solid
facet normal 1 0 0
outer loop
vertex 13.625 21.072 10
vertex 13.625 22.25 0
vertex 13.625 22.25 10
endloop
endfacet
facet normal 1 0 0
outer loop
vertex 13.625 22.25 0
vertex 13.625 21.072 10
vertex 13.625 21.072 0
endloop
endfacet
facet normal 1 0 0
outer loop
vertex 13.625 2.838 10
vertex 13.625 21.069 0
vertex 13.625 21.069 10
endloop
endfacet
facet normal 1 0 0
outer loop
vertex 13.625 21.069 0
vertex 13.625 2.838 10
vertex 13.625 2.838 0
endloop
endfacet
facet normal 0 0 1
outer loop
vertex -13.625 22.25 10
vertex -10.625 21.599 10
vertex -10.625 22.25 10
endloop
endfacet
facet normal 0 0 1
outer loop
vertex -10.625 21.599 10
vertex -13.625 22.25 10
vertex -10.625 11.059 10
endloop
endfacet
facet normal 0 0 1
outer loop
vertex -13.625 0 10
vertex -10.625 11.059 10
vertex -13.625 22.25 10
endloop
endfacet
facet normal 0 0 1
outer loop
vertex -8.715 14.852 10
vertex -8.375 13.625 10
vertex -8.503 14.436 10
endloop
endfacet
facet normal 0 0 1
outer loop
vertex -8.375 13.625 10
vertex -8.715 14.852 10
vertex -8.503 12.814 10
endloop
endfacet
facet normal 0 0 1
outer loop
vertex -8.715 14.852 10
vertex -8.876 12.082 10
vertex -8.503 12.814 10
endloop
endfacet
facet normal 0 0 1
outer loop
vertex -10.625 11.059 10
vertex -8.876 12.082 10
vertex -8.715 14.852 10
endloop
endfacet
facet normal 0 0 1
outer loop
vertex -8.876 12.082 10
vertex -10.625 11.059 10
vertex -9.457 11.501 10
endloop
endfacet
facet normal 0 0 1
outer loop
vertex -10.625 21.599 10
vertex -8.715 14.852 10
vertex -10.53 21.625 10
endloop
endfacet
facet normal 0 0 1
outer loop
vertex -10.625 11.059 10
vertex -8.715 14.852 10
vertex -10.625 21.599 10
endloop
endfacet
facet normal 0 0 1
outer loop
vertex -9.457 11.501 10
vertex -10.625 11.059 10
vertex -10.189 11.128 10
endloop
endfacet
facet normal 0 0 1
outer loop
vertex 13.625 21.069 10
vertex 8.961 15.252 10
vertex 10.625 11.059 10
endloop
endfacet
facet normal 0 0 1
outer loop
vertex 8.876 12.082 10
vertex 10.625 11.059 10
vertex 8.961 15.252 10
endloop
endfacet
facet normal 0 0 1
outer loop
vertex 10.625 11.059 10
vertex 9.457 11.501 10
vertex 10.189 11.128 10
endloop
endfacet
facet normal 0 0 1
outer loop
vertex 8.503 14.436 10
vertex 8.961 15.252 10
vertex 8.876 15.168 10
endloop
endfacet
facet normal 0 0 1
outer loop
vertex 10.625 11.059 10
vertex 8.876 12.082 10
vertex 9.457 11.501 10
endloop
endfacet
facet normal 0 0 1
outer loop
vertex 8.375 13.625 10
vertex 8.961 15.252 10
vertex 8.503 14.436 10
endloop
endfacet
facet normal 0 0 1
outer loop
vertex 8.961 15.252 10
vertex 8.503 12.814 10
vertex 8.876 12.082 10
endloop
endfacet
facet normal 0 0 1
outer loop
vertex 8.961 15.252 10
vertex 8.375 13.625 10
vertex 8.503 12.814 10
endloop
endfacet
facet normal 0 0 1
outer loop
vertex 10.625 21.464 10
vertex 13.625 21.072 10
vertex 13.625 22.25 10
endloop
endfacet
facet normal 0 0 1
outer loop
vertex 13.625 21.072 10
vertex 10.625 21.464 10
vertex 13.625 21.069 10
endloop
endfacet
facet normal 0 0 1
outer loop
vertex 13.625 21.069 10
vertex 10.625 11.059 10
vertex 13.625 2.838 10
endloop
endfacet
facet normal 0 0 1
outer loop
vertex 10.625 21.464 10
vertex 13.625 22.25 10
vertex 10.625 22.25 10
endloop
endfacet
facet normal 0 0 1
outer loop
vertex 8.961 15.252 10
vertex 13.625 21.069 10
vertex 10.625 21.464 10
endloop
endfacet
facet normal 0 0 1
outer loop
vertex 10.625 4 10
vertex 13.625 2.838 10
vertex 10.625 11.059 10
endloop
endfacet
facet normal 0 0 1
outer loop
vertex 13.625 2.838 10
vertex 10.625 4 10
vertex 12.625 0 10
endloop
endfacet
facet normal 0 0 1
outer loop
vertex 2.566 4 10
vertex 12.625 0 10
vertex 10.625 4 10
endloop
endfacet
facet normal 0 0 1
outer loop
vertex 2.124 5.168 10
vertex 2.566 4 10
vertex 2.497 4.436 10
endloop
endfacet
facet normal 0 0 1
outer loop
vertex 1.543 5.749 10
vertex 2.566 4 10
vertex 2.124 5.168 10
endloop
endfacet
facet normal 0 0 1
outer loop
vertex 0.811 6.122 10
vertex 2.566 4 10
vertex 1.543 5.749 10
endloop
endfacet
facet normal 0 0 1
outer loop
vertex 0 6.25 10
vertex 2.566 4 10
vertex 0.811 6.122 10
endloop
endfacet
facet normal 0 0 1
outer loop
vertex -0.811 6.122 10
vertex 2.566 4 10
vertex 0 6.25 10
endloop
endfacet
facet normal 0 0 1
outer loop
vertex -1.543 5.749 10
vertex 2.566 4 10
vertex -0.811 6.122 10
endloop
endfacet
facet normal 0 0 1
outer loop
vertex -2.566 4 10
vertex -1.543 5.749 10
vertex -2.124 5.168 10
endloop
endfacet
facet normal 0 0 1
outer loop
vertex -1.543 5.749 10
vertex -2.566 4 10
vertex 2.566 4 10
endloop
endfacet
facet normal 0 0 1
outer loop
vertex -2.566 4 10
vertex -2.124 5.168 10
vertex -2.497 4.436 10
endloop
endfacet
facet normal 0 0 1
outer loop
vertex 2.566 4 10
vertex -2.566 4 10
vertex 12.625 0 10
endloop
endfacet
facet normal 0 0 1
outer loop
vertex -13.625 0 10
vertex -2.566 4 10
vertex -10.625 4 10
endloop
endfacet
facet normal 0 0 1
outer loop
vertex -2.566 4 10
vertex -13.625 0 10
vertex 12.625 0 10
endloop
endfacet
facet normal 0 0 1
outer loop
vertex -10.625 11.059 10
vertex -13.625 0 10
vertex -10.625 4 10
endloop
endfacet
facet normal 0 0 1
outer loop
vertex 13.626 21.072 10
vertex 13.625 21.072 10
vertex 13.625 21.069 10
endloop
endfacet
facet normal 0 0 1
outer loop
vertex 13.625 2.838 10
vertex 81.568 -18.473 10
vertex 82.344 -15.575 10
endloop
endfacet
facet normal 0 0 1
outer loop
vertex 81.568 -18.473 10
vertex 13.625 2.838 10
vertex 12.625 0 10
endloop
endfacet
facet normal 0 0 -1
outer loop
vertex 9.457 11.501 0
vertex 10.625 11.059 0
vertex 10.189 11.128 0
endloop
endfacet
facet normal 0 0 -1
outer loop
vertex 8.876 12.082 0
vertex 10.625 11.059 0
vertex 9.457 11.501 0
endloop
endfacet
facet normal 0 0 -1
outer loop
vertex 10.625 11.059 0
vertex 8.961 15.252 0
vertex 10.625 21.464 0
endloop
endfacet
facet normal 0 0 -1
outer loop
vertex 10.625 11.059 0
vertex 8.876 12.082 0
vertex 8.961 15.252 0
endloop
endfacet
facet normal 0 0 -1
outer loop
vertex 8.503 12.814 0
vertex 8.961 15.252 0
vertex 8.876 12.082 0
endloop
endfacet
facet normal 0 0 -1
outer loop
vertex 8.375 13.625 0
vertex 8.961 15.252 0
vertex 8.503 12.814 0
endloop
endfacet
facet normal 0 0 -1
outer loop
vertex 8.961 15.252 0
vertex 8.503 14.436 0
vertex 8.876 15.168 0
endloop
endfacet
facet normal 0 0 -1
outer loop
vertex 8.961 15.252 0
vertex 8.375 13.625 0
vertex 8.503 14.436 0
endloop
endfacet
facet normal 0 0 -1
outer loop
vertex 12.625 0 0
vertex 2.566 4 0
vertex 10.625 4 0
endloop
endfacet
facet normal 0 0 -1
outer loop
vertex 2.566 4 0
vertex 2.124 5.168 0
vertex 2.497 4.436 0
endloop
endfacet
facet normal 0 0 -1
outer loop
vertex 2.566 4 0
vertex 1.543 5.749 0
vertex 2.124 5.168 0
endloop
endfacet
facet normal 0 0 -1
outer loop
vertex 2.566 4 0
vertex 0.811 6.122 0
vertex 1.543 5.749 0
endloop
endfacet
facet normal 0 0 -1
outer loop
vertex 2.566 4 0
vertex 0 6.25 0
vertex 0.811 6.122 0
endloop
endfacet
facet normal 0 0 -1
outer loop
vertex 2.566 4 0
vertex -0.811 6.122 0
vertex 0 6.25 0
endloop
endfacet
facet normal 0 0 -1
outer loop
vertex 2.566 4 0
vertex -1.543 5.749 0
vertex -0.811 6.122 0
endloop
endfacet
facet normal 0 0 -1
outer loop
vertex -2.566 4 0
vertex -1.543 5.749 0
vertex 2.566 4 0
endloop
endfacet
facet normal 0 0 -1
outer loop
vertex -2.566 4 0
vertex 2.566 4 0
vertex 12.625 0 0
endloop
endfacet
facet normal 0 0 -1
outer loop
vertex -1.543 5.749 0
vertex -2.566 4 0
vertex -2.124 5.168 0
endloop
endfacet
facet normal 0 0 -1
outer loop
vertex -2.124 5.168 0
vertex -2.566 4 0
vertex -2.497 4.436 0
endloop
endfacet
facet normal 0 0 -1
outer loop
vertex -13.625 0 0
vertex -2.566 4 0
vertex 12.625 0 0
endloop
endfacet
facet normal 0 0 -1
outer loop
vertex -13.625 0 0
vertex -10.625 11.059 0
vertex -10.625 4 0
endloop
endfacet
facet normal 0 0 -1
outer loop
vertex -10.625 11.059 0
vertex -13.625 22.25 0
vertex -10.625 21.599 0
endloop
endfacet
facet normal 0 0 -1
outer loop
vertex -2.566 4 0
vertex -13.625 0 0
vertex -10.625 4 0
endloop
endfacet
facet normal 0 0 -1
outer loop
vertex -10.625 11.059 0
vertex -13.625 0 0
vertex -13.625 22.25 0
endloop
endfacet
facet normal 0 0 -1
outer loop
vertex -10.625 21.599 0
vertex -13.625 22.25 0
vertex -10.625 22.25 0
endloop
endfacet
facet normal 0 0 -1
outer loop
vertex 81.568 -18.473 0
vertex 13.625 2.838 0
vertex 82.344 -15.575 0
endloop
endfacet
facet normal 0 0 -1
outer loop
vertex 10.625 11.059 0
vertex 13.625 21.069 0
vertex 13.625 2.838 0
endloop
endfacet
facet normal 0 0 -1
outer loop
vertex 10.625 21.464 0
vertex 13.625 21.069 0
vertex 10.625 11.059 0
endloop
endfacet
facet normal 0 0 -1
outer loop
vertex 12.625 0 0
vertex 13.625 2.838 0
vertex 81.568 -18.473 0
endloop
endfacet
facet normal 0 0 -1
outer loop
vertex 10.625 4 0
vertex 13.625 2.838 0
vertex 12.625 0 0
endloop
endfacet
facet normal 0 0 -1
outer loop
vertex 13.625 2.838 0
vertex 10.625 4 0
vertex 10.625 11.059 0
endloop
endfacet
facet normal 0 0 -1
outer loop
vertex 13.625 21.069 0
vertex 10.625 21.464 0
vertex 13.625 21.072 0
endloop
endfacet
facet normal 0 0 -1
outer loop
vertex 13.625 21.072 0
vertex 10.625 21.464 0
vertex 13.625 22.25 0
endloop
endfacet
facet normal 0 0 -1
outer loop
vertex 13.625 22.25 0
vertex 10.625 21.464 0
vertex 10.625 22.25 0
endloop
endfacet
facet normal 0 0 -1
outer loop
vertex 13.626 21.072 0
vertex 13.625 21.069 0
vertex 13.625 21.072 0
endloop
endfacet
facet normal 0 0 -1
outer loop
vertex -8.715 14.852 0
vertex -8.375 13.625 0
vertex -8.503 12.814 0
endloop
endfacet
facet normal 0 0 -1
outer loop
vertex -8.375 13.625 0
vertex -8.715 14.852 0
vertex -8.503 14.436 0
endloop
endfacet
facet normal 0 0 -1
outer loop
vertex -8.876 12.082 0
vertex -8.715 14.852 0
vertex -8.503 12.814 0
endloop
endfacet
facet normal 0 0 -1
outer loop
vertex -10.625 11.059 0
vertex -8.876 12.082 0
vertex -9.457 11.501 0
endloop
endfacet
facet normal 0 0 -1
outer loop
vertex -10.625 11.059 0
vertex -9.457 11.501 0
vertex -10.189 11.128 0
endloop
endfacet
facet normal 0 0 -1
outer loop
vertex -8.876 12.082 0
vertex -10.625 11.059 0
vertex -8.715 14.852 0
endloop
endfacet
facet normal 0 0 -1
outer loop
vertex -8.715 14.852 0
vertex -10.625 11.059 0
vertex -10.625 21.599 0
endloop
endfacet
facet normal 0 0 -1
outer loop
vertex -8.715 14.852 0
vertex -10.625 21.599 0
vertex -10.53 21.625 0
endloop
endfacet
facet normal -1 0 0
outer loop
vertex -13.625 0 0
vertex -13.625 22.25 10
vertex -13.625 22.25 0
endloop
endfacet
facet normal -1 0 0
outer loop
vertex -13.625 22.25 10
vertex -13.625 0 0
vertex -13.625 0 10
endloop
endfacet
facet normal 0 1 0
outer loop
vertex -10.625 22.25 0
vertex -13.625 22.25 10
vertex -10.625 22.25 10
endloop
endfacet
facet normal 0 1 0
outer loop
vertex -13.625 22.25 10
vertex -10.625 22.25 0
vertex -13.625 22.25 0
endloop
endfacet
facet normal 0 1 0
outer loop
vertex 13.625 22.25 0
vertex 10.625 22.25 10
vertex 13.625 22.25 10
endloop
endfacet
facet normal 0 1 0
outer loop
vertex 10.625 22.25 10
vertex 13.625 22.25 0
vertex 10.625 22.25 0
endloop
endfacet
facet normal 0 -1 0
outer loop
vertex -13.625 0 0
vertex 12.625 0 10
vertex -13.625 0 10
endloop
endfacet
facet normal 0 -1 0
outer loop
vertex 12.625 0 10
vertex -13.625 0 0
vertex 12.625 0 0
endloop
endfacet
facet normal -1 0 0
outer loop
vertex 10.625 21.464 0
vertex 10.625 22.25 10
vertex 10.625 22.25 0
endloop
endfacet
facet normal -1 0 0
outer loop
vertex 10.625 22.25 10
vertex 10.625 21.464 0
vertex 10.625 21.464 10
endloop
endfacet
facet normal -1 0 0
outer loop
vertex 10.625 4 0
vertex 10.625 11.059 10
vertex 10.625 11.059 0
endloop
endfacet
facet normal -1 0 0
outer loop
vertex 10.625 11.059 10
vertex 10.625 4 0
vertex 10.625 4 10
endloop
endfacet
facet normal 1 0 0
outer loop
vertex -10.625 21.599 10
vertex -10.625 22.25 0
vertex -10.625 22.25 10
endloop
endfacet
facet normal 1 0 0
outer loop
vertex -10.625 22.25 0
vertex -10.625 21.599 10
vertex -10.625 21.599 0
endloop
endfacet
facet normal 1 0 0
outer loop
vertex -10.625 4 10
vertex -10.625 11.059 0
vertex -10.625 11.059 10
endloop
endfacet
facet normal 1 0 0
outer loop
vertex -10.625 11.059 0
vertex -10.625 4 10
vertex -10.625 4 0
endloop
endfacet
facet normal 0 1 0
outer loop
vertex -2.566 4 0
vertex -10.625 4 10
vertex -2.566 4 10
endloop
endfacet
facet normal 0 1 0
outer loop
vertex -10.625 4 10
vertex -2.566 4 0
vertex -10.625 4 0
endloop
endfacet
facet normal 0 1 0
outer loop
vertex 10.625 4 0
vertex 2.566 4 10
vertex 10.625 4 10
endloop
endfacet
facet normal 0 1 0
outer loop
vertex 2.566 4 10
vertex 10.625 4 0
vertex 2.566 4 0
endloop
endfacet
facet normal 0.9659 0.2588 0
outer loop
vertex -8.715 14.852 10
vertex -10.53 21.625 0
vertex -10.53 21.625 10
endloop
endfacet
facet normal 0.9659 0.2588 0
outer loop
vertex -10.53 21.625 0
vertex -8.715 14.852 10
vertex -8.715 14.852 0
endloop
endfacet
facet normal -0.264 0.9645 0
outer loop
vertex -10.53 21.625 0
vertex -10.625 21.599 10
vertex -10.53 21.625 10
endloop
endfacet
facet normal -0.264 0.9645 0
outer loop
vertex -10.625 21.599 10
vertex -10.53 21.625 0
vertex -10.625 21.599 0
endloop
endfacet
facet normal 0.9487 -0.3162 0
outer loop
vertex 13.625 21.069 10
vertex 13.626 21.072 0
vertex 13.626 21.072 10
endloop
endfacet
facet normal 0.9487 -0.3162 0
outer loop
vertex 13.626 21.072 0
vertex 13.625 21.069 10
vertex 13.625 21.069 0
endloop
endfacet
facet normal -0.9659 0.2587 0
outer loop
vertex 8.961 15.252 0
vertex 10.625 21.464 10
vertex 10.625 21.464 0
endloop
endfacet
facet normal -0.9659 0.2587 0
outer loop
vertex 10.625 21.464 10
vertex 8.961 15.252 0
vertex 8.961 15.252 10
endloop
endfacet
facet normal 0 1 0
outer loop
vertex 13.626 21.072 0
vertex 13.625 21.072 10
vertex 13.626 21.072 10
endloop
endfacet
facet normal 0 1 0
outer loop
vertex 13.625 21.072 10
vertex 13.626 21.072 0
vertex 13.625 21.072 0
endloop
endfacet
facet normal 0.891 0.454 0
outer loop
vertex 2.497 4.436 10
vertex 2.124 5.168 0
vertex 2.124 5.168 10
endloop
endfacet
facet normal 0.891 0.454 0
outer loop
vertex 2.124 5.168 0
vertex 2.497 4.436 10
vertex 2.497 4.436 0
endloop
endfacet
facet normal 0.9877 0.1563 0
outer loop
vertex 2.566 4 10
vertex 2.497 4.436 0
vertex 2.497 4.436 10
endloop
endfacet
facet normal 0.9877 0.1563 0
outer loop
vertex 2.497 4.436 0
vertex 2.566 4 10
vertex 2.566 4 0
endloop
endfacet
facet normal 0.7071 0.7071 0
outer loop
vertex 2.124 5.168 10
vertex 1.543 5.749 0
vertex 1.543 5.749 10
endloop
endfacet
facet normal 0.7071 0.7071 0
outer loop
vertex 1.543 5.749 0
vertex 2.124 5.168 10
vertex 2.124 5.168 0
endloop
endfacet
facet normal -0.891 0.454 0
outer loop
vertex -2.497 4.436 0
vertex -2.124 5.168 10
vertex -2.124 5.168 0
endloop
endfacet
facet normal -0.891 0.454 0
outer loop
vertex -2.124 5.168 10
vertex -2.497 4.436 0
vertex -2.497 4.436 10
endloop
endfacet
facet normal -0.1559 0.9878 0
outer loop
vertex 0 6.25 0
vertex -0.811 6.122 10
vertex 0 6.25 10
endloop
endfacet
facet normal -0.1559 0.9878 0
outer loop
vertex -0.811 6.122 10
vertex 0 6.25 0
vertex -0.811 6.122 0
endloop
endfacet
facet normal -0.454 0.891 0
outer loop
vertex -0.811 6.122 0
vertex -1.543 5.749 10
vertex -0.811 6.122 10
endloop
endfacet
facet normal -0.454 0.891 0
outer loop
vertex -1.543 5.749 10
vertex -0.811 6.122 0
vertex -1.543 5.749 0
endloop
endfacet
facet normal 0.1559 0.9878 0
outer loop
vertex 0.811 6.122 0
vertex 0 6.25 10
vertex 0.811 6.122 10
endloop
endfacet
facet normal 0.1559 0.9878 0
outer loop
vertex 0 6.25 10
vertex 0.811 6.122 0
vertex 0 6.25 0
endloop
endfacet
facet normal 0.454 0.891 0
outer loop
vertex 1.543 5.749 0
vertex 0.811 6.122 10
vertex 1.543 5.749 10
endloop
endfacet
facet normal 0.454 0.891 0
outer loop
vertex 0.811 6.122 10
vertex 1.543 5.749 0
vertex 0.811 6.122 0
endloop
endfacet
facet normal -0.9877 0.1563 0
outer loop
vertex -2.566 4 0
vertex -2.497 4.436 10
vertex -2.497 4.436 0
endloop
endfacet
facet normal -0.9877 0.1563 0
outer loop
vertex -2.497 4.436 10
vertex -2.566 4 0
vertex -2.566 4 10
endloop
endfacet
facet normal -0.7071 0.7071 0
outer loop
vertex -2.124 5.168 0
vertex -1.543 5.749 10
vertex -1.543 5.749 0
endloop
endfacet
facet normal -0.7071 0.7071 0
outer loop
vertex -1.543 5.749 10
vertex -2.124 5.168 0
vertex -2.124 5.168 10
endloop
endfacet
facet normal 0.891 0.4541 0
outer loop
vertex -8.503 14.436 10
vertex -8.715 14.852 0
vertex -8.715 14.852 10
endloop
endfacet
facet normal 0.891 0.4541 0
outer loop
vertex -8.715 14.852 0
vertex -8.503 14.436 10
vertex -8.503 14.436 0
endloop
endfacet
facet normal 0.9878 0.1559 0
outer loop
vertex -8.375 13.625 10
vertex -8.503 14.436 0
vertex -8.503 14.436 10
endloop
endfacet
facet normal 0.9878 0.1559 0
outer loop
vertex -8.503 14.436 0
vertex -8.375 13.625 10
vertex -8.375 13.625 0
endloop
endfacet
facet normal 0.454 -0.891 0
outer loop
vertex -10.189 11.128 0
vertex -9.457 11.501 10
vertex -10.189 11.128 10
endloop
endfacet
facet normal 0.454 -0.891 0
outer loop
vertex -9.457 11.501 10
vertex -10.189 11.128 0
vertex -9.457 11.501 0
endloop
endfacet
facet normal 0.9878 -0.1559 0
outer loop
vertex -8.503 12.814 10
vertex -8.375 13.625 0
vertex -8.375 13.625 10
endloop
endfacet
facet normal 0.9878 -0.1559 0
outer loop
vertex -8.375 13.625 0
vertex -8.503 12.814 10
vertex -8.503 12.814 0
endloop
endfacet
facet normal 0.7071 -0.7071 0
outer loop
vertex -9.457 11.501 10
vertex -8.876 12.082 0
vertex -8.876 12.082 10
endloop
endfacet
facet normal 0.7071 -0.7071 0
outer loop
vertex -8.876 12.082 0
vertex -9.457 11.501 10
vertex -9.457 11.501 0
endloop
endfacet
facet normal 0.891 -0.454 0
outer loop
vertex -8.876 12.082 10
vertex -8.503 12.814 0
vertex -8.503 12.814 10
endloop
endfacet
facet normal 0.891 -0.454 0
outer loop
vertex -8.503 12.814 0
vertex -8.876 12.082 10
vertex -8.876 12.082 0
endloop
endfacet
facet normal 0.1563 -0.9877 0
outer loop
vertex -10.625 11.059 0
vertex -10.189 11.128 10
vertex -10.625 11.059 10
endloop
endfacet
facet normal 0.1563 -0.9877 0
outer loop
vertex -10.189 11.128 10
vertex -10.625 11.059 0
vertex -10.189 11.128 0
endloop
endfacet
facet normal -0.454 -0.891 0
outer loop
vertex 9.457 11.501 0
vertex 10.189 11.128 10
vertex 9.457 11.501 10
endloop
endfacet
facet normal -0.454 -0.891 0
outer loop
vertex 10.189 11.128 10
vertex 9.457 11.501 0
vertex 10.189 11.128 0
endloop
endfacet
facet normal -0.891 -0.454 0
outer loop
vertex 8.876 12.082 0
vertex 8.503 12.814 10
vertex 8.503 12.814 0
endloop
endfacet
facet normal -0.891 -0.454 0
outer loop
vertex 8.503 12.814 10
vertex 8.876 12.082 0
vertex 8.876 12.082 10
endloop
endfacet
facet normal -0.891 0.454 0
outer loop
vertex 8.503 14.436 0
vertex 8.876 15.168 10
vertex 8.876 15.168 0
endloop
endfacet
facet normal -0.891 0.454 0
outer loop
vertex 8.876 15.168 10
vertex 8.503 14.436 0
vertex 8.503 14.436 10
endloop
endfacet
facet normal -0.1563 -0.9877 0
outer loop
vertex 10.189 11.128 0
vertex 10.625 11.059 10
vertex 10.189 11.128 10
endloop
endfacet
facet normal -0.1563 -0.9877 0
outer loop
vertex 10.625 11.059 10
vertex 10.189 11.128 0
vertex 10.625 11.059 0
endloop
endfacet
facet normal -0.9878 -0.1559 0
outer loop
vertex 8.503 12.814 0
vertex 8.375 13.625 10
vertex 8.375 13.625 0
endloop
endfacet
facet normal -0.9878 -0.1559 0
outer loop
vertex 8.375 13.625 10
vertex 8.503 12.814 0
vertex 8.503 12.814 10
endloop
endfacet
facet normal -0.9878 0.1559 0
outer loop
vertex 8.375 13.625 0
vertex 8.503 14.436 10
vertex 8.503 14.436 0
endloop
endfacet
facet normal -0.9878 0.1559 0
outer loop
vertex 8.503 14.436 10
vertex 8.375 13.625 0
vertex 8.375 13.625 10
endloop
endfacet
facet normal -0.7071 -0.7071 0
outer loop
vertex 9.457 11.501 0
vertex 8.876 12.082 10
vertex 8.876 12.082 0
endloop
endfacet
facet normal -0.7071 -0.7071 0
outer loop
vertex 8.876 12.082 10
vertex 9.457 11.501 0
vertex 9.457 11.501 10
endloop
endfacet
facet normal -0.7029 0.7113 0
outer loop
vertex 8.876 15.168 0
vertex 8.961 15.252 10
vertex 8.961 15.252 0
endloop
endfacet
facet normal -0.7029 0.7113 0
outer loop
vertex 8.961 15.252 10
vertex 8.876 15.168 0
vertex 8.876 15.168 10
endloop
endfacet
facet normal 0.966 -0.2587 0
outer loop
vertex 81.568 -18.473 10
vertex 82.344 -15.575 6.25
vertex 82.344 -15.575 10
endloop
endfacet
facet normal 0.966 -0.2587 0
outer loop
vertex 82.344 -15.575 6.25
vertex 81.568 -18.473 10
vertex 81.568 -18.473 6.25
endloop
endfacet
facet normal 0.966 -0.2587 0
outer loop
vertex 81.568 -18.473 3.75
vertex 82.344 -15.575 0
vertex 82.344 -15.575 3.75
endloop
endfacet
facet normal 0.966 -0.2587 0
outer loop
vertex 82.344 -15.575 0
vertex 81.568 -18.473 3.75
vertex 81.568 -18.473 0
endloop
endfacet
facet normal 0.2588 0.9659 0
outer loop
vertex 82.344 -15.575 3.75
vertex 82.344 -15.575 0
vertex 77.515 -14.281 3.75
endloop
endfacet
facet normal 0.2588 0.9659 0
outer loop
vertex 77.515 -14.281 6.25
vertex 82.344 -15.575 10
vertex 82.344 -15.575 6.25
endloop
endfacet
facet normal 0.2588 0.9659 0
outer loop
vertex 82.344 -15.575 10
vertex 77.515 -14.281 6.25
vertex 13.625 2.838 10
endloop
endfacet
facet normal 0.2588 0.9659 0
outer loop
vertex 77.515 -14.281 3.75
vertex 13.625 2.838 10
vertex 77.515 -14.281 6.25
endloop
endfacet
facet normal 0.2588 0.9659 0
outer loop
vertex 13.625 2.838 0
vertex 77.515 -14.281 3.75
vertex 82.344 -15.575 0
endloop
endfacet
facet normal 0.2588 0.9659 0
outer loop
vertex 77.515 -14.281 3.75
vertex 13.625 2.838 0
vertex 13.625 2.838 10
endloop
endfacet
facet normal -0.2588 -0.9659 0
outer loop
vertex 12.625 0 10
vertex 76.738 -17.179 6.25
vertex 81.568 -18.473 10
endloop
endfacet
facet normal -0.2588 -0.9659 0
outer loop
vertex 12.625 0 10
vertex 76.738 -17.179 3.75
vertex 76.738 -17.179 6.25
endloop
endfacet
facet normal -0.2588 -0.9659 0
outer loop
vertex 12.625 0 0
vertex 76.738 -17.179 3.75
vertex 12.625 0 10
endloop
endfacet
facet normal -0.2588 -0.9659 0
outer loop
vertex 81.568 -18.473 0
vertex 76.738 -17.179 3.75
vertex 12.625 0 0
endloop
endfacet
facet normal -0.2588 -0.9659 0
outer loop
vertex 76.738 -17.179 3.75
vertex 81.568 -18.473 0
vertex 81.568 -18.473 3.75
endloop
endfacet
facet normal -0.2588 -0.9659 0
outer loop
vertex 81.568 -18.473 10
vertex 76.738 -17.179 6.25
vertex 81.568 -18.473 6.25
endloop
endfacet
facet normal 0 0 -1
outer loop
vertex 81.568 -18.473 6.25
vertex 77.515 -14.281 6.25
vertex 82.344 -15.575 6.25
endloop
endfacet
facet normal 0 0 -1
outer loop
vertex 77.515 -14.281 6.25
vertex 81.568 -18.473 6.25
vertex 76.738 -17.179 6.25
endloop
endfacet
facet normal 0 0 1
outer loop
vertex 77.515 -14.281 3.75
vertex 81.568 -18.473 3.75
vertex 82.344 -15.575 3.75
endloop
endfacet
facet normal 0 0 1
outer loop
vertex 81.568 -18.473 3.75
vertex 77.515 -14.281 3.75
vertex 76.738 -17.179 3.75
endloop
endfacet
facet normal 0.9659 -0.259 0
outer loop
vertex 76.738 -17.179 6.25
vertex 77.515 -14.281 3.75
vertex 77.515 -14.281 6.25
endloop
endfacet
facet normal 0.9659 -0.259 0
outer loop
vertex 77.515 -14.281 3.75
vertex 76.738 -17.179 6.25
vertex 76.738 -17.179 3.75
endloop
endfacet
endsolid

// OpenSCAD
// nischi 
// mendel max clip

width = 27.25;
height  = 22.25;
depth  = 10.00; // seen from bird's eye view of scad file

side_wall = 3.0;

teeth_y = 20.00;    
teeth_d = 5.25; // diameter

//filament wheel has radius 85mm
protrude_length = 75-width/2; // amount to come out of 2020 bar 
support_tip_length = 10;
support_tip_space = 2.5;

translate([0,1,0]) rotate([0,0,0]) tool_clip();
// extension
  translate([width/2-1,0,0]) // -1 on x for spacing from rotate
  rotate([0,0,-15])
  union(){
    cube([protrude_length,3,depth]);
    translate([protrude_length,0,0])
    difference(){
      color("orange")
      cube([support_tip_length,3,depth]);
      color("purple")
      translate([support_tip_length/2,0,depth/2-support_tip_space/2])
      cube([support_tip_length,3,support_tip_space]);
    }
  }

module tool_clip()
{
  difference()
  {
    union()
    {
        color("blue") translate([-width/2,-1,0]) cube([width,height,depth]);  
    }

    union()
    {
       color("blue") translate([-width/2+side_wall,side_wall,-1]) 
       cube([width-2*side_wall,height,depth*2]);
           // cylinder(20, r=5/2,$fn=20);
    }
  }

  
  color("lightblue") translate([-width/2+2.3,teeth_y/2+2,0]) 
  rotate([0,0,15]) cube([3,height/2-3,depth]);  

  color("lightblue") translate([+width/2-5,teeth_y/2+3,0]) 
  rotate([0,0,-15]) cube([3,height/2-3,depth]);

  color("red")  translate([0,teeth_d/2,0]) cylinder(depth, r=teeth_d/2,$fn=20);

  color("orange")  translate([-width/2+teeth_d/2,teeth_d/2+teeth_y/2,0]) 
  cylinder(depth, r=teeth_d/2,$fn=20);
  color("orange")  translate([ width/2-teeth_d/2,teeth_d/2+teeth_y/2,0]) 
  cylinder(depth, r=teeth_d/2,$fn=20);
}
